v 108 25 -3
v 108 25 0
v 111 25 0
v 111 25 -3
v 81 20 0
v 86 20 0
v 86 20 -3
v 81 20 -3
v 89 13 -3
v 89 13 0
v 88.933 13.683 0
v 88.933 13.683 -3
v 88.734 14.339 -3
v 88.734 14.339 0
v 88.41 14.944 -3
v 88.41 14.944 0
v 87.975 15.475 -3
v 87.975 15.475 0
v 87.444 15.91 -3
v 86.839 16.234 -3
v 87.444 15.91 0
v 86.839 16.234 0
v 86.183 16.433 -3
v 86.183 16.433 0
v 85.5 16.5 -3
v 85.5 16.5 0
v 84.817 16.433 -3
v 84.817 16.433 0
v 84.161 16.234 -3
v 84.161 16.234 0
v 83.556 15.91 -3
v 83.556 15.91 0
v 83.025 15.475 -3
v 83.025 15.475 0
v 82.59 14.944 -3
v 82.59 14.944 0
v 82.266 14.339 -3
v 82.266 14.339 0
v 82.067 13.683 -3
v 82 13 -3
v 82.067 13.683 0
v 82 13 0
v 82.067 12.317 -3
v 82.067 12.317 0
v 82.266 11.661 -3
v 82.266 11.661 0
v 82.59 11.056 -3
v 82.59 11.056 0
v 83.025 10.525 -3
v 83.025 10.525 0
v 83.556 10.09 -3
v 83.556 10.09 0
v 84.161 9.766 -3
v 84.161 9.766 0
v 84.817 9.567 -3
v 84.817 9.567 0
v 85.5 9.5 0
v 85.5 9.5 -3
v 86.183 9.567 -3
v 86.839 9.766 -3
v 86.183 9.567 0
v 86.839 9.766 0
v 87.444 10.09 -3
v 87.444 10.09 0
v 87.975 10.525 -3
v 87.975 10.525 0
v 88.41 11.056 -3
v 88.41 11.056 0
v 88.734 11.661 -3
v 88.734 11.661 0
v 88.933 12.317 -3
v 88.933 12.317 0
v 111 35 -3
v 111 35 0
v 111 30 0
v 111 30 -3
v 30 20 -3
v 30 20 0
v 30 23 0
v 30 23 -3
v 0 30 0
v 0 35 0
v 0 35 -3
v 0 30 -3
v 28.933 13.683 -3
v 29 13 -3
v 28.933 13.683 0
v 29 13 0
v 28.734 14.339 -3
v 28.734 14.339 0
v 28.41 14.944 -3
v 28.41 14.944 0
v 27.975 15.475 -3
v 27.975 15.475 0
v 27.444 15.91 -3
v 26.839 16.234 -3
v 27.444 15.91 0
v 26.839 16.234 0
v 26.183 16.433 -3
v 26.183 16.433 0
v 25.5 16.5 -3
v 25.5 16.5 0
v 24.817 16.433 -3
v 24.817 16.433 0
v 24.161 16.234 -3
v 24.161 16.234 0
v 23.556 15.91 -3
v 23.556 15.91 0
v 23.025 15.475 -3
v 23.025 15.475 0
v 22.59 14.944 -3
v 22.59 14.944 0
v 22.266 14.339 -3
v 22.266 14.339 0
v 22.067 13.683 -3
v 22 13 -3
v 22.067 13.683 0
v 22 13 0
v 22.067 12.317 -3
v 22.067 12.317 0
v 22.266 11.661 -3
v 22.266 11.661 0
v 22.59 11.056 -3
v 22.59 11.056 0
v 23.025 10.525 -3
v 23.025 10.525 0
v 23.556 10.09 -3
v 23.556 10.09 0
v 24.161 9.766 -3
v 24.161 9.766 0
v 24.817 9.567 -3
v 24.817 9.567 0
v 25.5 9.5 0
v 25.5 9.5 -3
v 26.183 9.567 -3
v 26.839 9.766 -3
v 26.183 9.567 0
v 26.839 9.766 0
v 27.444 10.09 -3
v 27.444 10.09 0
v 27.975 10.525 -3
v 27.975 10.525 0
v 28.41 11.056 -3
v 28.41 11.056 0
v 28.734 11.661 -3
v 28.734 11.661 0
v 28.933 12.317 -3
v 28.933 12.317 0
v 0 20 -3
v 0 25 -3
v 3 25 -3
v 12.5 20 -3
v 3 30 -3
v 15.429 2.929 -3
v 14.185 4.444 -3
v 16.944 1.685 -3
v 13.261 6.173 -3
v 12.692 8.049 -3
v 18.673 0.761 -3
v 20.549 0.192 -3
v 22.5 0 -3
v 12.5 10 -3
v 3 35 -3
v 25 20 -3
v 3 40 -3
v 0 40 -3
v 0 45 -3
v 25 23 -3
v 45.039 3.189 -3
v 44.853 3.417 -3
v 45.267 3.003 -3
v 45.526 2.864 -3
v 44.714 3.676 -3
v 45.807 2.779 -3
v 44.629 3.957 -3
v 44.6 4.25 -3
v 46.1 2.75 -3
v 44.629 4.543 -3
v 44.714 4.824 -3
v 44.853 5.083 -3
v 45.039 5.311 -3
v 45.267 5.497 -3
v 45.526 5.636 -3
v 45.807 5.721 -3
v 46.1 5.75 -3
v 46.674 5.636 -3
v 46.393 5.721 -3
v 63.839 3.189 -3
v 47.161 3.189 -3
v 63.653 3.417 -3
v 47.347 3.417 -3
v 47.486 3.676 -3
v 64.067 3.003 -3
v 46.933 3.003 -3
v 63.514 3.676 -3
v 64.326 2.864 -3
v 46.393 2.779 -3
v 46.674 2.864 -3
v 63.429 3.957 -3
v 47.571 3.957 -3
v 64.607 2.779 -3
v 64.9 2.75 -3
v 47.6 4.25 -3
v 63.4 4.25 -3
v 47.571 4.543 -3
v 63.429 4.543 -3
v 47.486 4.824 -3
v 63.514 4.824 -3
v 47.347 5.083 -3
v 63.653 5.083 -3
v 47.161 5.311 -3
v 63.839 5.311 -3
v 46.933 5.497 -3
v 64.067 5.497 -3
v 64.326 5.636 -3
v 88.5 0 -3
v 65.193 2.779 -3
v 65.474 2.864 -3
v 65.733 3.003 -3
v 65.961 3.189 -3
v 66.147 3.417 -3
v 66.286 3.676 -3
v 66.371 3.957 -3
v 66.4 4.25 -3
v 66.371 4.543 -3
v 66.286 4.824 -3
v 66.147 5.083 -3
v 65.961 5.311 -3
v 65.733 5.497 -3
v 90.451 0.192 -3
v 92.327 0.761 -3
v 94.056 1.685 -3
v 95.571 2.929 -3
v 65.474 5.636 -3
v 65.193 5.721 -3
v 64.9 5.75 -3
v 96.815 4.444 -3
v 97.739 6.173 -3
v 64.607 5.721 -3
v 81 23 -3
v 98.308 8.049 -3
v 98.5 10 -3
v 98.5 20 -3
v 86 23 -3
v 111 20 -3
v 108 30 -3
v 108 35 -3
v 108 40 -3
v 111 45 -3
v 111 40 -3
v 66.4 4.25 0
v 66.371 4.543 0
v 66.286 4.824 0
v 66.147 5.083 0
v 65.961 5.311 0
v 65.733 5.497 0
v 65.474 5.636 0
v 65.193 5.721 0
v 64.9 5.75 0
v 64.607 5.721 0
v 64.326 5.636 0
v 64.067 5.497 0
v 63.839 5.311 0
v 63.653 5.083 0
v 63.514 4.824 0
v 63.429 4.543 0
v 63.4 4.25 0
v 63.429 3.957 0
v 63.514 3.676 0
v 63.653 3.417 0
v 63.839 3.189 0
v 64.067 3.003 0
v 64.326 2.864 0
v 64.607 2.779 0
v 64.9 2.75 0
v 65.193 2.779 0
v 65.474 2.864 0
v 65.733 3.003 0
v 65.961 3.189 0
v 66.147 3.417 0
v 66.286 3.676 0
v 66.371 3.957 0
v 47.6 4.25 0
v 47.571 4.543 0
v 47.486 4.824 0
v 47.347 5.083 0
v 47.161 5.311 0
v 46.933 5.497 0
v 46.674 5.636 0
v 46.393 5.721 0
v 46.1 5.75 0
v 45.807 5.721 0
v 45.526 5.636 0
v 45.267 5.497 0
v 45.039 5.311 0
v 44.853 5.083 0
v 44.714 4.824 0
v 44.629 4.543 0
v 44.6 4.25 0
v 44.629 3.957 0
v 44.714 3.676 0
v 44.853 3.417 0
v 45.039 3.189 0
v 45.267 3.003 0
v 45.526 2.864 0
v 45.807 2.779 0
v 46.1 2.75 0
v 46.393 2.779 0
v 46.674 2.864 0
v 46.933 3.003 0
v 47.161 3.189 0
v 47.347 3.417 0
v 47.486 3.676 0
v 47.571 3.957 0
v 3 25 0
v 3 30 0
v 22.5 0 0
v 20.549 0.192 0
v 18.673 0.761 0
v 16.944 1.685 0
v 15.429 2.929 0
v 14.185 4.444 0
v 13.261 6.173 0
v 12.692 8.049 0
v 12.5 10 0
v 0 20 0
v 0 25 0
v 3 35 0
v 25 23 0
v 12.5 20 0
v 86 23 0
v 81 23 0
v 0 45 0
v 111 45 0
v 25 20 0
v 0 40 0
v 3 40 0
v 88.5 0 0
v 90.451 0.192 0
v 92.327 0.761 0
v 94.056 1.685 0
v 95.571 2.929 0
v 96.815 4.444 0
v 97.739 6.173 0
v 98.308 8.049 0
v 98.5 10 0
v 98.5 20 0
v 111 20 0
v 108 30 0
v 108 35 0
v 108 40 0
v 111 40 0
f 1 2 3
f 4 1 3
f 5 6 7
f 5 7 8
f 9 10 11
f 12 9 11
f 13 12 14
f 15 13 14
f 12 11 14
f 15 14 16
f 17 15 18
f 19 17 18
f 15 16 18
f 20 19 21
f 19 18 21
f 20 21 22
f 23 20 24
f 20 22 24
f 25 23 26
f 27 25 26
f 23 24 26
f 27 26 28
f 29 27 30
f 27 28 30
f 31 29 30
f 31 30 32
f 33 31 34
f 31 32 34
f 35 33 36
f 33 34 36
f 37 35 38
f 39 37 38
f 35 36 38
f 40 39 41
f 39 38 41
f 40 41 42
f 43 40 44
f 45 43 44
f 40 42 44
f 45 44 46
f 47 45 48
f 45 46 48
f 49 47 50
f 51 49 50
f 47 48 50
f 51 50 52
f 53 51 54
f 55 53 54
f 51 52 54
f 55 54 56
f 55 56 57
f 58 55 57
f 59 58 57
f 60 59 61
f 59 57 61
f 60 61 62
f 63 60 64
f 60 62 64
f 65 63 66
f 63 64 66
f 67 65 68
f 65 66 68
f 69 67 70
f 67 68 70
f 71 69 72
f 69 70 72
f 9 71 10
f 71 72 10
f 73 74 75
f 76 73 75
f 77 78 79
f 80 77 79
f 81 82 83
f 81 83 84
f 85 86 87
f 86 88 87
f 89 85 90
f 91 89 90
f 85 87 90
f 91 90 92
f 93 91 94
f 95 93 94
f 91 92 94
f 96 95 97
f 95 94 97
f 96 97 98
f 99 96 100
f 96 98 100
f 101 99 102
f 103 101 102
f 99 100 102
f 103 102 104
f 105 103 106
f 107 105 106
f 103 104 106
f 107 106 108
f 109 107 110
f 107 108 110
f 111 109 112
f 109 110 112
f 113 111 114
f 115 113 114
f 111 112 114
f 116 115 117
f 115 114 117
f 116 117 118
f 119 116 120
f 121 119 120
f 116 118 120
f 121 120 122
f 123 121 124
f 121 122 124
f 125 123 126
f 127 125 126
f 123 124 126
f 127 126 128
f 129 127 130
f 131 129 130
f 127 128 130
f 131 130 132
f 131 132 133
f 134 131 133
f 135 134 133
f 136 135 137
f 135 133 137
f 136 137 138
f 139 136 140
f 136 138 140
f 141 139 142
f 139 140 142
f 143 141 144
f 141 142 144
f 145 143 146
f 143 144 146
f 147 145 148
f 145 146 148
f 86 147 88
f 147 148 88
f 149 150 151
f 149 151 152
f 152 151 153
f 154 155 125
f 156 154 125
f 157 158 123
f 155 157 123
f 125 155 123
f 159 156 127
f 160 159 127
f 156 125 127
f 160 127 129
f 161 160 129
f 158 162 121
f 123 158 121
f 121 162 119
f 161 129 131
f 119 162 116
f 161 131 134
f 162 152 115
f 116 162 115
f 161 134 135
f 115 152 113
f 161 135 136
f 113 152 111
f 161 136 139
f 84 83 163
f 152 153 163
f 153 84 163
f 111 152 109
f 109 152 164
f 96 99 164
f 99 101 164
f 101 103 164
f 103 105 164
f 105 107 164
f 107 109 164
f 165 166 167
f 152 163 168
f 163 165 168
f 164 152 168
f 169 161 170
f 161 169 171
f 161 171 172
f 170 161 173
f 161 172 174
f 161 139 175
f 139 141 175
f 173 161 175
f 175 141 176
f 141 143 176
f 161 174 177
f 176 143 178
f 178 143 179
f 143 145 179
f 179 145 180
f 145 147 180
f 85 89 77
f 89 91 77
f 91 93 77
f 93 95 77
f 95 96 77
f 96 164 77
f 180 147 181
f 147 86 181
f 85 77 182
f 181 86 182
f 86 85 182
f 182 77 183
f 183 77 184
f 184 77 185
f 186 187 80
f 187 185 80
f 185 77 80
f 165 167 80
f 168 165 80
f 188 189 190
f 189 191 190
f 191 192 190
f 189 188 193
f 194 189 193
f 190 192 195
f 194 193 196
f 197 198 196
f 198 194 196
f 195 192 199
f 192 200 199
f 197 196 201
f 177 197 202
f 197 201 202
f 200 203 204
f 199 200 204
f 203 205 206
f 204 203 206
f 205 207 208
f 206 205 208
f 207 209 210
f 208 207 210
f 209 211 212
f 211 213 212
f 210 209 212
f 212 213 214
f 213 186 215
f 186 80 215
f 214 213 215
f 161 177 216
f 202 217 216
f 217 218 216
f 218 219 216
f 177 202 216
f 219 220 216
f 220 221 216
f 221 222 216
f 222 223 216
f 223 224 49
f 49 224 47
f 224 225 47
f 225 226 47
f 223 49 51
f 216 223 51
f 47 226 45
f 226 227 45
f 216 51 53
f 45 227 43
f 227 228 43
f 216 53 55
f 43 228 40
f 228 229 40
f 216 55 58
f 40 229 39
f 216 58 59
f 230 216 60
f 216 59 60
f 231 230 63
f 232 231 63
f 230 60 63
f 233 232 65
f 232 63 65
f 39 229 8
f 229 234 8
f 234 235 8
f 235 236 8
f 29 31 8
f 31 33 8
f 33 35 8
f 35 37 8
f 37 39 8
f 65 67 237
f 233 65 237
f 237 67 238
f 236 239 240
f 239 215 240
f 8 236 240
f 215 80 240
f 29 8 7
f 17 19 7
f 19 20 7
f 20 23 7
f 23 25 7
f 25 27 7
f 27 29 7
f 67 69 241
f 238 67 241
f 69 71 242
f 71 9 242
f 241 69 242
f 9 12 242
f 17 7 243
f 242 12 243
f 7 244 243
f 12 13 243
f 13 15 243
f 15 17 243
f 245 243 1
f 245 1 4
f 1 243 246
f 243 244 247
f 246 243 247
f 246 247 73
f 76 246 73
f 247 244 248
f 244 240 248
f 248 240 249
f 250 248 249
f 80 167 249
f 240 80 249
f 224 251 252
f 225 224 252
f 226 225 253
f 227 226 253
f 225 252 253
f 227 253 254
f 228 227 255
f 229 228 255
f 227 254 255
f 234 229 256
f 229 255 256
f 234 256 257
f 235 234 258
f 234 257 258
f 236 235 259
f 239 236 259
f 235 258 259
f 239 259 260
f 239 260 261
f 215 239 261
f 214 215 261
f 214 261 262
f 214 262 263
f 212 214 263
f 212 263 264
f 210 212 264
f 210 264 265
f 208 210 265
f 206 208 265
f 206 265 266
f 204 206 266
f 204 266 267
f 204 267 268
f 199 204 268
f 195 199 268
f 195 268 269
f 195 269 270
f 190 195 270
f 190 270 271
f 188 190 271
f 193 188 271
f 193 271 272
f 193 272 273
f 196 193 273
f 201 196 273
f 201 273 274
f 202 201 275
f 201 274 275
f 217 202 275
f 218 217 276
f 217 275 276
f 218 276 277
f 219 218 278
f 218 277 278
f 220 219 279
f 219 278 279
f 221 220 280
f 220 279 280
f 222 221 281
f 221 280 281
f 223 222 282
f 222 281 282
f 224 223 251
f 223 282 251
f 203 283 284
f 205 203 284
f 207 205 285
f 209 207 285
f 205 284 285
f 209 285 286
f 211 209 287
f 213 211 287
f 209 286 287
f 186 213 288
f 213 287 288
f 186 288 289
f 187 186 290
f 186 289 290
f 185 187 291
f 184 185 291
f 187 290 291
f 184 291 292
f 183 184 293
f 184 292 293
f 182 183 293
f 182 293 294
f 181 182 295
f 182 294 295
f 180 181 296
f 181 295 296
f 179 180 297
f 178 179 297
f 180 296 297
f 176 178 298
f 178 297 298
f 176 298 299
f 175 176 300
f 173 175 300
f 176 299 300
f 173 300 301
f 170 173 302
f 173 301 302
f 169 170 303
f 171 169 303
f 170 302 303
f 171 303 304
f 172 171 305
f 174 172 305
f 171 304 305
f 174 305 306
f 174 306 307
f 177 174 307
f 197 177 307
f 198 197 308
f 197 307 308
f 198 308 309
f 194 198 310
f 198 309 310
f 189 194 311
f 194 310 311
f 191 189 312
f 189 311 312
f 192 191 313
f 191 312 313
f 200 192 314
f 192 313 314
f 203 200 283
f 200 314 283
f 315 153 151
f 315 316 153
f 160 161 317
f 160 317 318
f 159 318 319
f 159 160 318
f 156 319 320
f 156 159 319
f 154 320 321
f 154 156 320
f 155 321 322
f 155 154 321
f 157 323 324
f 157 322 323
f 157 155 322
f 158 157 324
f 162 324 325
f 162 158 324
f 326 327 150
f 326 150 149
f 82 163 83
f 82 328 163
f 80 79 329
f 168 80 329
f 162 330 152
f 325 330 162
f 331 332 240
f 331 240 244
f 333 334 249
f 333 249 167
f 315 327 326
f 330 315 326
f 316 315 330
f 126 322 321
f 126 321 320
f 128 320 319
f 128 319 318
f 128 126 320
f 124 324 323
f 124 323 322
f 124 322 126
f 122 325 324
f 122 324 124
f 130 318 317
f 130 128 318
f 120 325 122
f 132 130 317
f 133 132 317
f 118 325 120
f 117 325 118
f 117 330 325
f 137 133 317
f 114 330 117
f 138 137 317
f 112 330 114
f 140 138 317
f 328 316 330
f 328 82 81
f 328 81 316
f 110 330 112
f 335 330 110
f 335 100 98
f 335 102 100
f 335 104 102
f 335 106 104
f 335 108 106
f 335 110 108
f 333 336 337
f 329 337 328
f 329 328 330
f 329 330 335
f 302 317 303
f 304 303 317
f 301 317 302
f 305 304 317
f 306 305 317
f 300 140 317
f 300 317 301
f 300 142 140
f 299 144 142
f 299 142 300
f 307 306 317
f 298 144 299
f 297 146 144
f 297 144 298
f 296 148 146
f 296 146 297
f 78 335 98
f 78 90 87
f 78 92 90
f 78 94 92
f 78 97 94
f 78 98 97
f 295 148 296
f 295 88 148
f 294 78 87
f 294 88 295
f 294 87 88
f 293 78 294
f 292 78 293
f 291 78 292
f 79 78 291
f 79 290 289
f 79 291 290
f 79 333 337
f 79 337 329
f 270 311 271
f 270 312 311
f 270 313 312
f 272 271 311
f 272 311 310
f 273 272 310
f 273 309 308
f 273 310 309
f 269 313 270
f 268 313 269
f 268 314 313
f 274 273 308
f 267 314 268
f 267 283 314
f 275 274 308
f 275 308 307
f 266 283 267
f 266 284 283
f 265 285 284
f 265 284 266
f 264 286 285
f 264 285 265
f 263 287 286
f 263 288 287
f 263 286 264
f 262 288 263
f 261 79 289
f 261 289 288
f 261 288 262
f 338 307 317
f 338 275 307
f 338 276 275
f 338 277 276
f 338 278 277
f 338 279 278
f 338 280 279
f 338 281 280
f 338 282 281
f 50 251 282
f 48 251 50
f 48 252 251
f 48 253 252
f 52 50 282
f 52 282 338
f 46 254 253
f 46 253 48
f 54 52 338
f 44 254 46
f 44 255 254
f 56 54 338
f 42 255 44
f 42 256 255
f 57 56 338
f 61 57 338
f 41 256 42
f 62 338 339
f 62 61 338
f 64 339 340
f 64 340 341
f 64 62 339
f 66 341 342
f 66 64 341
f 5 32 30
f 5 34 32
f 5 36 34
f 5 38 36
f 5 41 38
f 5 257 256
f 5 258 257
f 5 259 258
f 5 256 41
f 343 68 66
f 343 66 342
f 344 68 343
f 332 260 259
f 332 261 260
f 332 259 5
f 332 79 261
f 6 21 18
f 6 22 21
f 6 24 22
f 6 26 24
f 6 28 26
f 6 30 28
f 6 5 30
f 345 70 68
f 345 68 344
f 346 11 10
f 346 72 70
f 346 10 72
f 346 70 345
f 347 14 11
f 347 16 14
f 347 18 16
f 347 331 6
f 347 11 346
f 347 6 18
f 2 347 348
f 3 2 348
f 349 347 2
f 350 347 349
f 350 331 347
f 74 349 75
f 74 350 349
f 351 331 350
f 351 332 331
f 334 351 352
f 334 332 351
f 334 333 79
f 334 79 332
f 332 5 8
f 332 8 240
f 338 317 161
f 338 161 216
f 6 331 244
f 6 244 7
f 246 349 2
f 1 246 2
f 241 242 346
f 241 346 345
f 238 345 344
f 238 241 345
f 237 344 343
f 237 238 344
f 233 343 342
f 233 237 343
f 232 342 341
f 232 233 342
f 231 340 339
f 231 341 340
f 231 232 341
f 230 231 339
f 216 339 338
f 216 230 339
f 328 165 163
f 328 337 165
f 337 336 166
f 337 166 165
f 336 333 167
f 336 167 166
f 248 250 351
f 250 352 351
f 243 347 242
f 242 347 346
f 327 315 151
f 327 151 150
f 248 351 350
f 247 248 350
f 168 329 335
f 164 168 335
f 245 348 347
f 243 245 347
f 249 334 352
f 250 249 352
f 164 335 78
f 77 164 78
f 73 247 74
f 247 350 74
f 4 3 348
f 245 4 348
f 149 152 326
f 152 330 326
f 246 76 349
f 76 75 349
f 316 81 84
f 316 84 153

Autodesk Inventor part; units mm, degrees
ref_plane "YZ Plane" through (0, 0, 0) normal (1, 0, 0) x (0, 1, 0)
ref_plane "XZ Plane" through (0, 0, 0) normal (0, 1, 0) x (-1, 0, 0)
ref_plane "XY Plane" through (0, 0, 0) normal (0, 0, 1) x (1, 0, 0)
sketch "Sketch1" plane through (0, 0, 0) normal (0, 0, 1) x (1, 0, 0)
  line L0 (12.5, 0) -> (98.5, 0)
  line L1 (111, 45) -> (0, 45)
  line L2 (12.5, 20) -> (12.5, 0)
  line L3 (111, 20) -> (98.5, 20) construction
  line L4 (111, 20) -> (98.5, 20)
  line L5 (98.5, 20) -> (98.5, 0)
  line L6 (12.5, 20) -> (0, 20)
  line L7 (12.5, 0) -> (25.5, 0) construction
  line L8 (12.5, 13) -> (12.5, 0) construction
  line L9 (98.5, 0) -> (85.5, 0) construction
  line L10 (98.5, 13) -> (98.5, 0) construction
  line L11 (0, 45) -> (0, 40)
  line L12 (0, 40) -> (3, 40)
  line L13 (3, 40) -> (3, 35)
  line L14 (3, 35) -> (0, 35)
  line L15 (0, 35) -> (0, 30)
  line L16 (0, 30) -> (3, 30)
  line L17 (3, 30) -> (3, 25)
  line L18 (3, 25) -> (0, 25)
  line L19 (0, 25) -> (0, 20)
  line L20 (0, 45) -> (0, 40)
  line L21 (0, 35) -> (0, 30)
  line L22 (0, 25) -> (0, 20)
  line L23 (111, 45) -> (111, 40)
  line L24 (111, 40) -> (108, 40)
  line L25 (108, 40) -> (108, 35)
  line L26 (108, 35) -> (111, 35)
  line L27 (111, 35) -> (111, 30)
  line L28 (111, 30) -> (108, 30)
  line L29 (108, 30) -> (108, 25)
  line L30 (108, 25) -> (111, 25)
  line L31 (111, 25) -> (111, 20)
  line L32 (111, 40) -> (111, 45)
  line L33 (111, 20) -> (111, 25)
  line L34 (111, 30) -> (111, 35)
  circle A0 centre (25.5, 13) radius 3.5
  circle A1 centre (85.5, 13) radius 3.5
  dimension "d52" = 7
  dimension "d53" = 7
extrude "Extrusion1" add sketch "Sketch1" against normal blind 3 contours L2 L6 L19 L18 L17 L16 L15 L14 L13 L12 L11 L1 L23 L24 L25 L26 L27 L28 L29 L30 L31 L4 L5 L0 | A0 | A1
fillet "Fillet1" radius 10 2 edges at (12.5, 0, -1.5) (98.5, 0, -1.5)
sketch "Sketch2" plane through (0, 0, 0) normal (0, 0, 1) x (1, 0, 0)
  line L0 (25, 20) -> (30, 20)
  line L1 (30, 20) -> (30, 23)
  line L2 (30, 23) -> (25, 23)
  line L3 (25, 23) -> (25, 20)
  line L4 (86, 20) -> (81, 20)
  line L5 (81, 20) -> (81, 23)
  line L6 (81, 23) -> (86, 23)
  line L7 (86, 23) -> (86, 20)
  point P0 (0, 0)
  point P1 (0, 20)
  point P2 (111, 20)
  dimension "d32" = 5
  dimension "d33" = 3
  dimension "d34" = 5
  dimension "d35" = 25
  dimension "d36" = 5
  dimension "d37" = 3
  dimension "d38" = 5
extrude "Extrusion3" cut sketch "Sketch2" against normal blind 10
sketch "Sketch3" plane through (0, 0, 0) normal (0, 0, 1) x (1, 0, 0)
  circle A0 centre (64.9, 4.25) radius 1.5
  line L0 (0, 45) -> (111, 45) projected
  circle A1 centre (46.1, 4.25) radius 1.5
  point P0 (0, 0)
  point P1 (85.5, 13)
  dimension "d49" = 3
  dimension "d50" = 3
extrude "Extrusion4" cut sketch "Sketch3" against normal blind 10
extrude "Extrusion5" cut sketch "Sketch1" against normal blind 10 contours A0 | A1
properties part number "Zijkant"
